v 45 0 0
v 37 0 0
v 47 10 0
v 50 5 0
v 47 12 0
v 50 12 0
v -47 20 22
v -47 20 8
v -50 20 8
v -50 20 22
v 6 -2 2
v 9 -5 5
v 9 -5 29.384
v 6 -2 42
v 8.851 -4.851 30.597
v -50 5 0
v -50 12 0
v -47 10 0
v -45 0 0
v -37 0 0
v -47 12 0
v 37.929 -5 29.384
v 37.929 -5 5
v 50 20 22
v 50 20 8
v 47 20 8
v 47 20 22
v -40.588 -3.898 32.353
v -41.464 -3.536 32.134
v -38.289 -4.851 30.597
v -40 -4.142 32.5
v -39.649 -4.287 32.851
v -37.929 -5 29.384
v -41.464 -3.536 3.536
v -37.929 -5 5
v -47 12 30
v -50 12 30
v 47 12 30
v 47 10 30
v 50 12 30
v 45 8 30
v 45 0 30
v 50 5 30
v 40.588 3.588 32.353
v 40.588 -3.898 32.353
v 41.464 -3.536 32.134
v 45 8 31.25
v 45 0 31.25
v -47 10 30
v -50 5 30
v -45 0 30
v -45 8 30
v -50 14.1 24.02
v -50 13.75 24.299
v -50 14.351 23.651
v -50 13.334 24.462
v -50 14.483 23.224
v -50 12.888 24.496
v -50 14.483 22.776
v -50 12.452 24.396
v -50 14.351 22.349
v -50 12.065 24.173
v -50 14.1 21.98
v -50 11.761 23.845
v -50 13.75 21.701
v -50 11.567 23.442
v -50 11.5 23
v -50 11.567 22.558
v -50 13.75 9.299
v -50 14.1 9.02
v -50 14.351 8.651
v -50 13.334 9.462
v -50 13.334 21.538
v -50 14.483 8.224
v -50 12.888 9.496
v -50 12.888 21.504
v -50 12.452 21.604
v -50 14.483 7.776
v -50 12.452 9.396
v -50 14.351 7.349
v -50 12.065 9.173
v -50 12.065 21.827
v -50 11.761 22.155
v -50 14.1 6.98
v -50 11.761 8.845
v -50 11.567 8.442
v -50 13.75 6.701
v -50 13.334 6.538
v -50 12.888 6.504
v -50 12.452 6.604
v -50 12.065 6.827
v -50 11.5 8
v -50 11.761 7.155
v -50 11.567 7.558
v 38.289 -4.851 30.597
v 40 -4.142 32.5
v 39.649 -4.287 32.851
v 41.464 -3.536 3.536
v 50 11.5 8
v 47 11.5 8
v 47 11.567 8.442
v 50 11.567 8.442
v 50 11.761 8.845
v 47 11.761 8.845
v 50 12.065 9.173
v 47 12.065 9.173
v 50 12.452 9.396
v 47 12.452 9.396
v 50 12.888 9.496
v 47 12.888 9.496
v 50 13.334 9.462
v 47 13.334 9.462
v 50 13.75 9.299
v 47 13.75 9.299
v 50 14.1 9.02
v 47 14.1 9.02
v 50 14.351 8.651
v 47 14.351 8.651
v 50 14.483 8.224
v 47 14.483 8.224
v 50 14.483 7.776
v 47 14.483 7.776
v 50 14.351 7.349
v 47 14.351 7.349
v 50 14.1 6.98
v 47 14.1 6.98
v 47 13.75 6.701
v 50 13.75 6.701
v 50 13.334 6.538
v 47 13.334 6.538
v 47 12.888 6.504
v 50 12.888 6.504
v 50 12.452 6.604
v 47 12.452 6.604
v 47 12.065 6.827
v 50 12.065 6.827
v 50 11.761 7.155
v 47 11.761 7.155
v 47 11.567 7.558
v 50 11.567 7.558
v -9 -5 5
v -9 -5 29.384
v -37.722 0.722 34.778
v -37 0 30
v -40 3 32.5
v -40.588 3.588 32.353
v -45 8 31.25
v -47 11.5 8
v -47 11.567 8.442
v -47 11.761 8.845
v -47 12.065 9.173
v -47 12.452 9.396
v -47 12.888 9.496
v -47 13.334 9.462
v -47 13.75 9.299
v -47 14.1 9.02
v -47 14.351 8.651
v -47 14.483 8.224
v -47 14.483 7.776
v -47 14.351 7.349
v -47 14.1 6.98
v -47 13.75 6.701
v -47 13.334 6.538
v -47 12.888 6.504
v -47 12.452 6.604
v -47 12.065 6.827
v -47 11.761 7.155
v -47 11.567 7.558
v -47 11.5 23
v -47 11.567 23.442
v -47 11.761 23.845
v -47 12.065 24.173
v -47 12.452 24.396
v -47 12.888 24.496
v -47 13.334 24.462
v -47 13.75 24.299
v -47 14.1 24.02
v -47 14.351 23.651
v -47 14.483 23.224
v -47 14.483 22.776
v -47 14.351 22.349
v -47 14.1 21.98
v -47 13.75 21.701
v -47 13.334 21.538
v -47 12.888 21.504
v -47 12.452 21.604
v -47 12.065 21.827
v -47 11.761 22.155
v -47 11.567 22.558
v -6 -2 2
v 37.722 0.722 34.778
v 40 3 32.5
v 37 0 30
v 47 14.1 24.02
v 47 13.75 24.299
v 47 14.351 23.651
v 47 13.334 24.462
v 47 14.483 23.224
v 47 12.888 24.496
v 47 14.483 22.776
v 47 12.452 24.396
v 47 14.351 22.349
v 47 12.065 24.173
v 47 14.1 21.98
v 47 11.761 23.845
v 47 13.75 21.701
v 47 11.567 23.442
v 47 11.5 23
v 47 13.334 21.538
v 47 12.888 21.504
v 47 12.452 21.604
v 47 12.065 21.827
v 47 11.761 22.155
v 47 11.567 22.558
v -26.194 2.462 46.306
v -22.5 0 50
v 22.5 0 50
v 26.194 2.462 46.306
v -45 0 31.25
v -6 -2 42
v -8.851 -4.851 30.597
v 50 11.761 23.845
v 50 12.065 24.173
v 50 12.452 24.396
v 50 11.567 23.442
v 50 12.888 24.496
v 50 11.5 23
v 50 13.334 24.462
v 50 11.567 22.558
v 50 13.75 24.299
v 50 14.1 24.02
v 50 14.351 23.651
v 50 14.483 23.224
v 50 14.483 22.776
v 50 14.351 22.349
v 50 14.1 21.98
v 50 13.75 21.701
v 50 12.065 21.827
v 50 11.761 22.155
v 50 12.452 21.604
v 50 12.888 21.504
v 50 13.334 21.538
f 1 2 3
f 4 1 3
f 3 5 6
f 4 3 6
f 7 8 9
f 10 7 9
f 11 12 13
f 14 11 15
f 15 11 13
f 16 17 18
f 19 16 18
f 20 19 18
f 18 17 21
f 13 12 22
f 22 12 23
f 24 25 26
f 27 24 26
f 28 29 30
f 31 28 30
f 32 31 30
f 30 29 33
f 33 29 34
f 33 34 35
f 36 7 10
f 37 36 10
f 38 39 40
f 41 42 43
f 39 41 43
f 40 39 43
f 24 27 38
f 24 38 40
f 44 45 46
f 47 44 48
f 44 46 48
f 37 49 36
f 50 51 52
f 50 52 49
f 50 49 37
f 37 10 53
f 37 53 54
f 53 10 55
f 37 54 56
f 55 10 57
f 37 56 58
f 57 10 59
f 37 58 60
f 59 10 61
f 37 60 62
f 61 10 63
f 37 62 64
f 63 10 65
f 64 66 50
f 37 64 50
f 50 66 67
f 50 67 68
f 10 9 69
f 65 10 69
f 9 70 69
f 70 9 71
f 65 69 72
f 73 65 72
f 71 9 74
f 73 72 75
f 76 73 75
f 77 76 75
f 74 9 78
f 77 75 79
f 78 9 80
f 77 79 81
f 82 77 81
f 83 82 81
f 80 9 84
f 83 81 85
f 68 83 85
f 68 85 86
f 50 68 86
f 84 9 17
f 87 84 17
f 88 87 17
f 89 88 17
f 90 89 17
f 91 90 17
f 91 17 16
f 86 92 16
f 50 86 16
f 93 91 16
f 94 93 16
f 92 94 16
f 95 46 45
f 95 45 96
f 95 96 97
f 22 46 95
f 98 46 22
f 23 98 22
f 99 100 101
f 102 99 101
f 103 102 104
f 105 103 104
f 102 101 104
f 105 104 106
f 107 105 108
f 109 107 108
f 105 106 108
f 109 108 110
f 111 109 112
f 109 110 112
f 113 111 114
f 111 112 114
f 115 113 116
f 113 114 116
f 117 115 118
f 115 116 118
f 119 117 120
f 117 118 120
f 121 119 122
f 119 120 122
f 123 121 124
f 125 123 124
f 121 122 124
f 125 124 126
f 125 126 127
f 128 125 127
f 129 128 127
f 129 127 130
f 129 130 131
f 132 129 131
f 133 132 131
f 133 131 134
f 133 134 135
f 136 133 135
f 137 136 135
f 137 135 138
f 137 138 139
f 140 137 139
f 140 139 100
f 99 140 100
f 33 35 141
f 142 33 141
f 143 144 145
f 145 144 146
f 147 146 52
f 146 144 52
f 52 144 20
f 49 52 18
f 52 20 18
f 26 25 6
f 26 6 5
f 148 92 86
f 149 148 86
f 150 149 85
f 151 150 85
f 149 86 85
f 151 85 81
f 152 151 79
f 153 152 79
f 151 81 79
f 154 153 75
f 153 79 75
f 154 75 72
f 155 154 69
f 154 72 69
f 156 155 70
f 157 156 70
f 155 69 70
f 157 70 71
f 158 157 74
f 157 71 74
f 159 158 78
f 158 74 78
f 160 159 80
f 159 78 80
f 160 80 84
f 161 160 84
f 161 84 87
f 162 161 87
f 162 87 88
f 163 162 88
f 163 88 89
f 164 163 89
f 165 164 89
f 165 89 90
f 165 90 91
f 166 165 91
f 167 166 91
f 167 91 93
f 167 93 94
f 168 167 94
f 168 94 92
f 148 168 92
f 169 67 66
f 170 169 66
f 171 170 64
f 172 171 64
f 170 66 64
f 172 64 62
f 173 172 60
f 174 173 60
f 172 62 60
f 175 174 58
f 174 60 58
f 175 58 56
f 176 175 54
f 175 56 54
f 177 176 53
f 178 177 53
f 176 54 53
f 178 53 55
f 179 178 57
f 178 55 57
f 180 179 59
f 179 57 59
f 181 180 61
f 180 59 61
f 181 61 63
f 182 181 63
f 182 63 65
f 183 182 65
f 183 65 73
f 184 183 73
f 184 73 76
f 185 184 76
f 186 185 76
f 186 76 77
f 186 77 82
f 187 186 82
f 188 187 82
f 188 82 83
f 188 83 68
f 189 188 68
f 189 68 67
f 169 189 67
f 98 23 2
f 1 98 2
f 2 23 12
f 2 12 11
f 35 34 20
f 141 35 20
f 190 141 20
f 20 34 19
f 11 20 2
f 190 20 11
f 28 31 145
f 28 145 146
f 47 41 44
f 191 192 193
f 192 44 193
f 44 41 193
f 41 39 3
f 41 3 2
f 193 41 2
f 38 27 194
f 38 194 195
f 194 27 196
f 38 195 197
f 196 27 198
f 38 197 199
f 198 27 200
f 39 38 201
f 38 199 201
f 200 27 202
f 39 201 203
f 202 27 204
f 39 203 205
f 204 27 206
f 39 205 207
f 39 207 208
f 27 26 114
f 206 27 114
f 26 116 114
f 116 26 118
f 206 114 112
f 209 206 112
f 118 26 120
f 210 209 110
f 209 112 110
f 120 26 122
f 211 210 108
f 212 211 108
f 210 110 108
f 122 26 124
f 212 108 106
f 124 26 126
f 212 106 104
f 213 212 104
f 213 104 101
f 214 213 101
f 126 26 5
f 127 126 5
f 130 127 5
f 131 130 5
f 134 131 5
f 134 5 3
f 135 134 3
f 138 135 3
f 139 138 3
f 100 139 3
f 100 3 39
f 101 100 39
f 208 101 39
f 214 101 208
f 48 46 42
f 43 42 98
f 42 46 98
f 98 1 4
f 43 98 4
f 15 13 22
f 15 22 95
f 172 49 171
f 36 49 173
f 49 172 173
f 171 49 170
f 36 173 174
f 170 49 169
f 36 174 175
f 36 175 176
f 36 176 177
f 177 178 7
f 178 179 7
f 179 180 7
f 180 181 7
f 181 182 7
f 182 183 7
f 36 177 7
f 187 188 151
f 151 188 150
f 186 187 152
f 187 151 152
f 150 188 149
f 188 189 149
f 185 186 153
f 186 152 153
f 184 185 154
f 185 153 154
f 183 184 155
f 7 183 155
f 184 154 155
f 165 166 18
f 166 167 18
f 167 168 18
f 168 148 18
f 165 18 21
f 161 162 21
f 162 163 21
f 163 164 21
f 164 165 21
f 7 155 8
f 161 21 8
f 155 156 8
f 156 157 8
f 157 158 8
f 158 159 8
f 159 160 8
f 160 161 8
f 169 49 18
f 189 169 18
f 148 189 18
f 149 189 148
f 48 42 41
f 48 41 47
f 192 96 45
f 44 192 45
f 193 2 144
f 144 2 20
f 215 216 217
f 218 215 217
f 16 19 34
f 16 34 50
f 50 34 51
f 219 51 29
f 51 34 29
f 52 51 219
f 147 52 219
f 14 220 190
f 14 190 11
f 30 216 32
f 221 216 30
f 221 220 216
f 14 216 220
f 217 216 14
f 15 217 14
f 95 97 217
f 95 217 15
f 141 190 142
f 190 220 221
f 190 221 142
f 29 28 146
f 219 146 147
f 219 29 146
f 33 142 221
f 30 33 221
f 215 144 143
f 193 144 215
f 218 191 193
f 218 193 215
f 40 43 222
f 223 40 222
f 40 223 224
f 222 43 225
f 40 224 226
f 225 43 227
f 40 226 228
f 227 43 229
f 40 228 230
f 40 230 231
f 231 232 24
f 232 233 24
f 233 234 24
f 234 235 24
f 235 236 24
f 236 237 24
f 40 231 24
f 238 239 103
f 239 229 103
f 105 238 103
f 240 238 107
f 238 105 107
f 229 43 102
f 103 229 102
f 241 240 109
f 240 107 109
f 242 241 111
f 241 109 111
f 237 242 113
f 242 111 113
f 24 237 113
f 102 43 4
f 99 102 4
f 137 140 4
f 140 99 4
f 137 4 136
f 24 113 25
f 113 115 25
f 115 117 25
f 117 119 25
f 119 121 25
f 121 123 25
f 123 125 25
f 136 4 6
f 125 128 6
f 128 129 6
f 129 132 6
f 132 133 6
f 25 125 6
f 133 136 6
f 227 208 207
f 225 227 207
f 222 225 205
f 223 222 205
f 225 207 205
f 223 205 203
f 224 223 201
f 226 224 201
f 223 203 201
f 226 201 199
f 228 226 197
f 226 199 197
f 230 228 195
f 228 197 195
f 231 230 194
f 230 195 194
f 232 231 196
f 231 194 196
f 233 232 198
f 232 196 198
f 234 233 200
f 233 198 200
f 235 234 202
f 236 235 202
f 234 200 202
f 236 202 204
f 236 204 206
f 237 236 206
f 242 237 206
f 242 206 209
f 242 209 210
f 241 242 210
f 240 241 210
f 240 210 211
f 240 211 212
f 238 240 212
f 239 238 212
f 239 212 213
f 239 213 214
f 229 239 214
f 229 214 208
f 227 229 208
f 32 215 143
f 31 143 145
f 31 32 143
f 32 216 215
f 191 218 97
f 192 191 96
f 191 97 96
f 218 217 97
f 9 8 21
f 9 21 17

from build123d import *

# Parameters (mm, degrees)
F1_DEPTH      = 30
F2_SIZE       = 10
F4_DEPTH      = 50
F5_DEPTH      = 20
F6_DEPTH      = 25
F8_DEPTH      = 25.001
F9_DEPTH      = 25
F11_W         = 8
F11_H         = 3
F12_DEPTH     = 50.001
F13_T1_DEPTH  = 61.7168298797
F13_T3_DEPTH  = 40.0719817161
F13_T5_DEPTH  = 45.2357066129
F13_T10_DEPTH = 64.7177203375
F13_T15_DEPTH = 64.7177203375
F14_T1_DEPTH  = 56.7168298797
F14_T3_DEPTH  = 45.2357066129
F14_T5_DEPTH  = 35.0719817161
F15_R         = 1.5
F16_DEPTH     = 100.001
F18_SIZE      = 8
F19_SIZE      = 2.99999


# Not quite as in the source:
# - a fillet or chamfer that OpenCascade refuses, or shapes differently, is made with other operations: its cross-section is extruded or revolved along the edge and cut away or added
# - a fillet or chamfer is up to 0.001 mm smaller than in the source, because OpenCascade refuses the exact size


with BuildPart() as f1:
    # F0 (on Top) → F1 (new body)
    with BuildSketch(Plane.XY):
        Polygon((-47, 20), (-50, 20), (-50, -5), (50, -5), (50, 20), (47, 20), (47, 0), (-47, 0), align=None)
    extrude(amount=F1_DEPTH)

    # F2
    f2_edges = [f1.edges().sort_by_distance(p)[0] for p in [
        (-47, 0, 15),
        (47, 0, 15),
        (-50, -5, 15),
        (50, -5, 15),
    ]]
    chamfer(f2_edges, length=F2_SIZE)

    # F3 (on Right) → F4 (join, symmetric)
    with BuildSketch(Plane.YZ):
        Polygon((-5, 30), (0, 30), (2.9104275004, 49.2723931249), (0, 50), align=None)
    extrude(amount=F4_DEPTH, both=True)

    # F5 (add): faces of the model
    f5_faces = [f1.faces().sort_by_distance(p)[0] for p in [
        (46.0427350427, 7.6495726496, 30),
        (-46.0427350427, 7.6495726496, 30),
    ]]
    extrude(f5_faces, amount=F5_DEPTH)

    # F6 (cut): faces of the model
    f6_faces = [f1.faces().sort_by_distance(p)[0] for p in [
        (46.1111111111, -2.7777777778, 30),
        (-46.1111111111, -2.7777777778, 30),
    ]]
    extrude(f6_faces, amount=-F6_DEPTH, mode=Mode.SUBTRACT)

    # F7 (on face) → F8 (cut, through all)
    with BuildSketch(Plane.XZ.offset(5)):
        Polygon((40.5882352941, 32.3529411765), (45, 50), (37, 50), (22.5, 50), (40, 32.5), align=None)
        Polygon((45, 31.25), (45, 50), (40.5882352941, 32.3529411765), align=None)
        Polygon((45, 50), (47.9104275004, 49.2723931249), (45.1819017188, 31.2045245703), (50, 30), (50, 50), align=None)
    extrude(amount=-F8_DEPTH, mode=Mode.SUBTRACT)

    # F9 (cut): a face of the model
    f9_faces = [f1.faces().sort_by_distance(p)[0] for p in [
        (46.0411372728, 0, 41.900989059),
    ]]
    extrude(f9_faces, amount=-F9_DEPTH, mode=Mode.SUBTRACT)

    # F10: F1 across plane


with BuildPart() as f1_1:
    add(f1.part)
    add(f1.part.mirror(Plane.YZ), mode=Mode.INTERSECT)

    # F11 (on face) → F12 (cut, through all)
    with BuildSketch(Plane(origin=(0, 0, 0), x_dir=(1, 0, 0), z_dir=(0, 0, -1))):
        with Locations((0, 3.5)):
            Rectangle(F11_W, F11_H)
    extrude(amount=-F12_DEPTH, mode=Mode.SUBTRACT)

    # F13: chamfer of 5 on 5 edges, made by hand

    # F13_s2 → F13_t1 (cut)
    with BuildSketch(Plane.YZ.offset(-52.8584149398)):
        Polygon((0, 0), (-5, 5), (-5, 0), align=None)
    extrude(amount=F13_T1_DEPTH, mode=Mode.SUBTRACT)

    # F13_s4 → F13_t3 (cut)
    with BuildSketch(Plane.YZ.offset(-42.0359908581)):
        Polygon((-5, 29.3844718719), (-4.8507125007, 30.5971499971), (-5, 30), align=None)
    extrude(amount=F13_T3_DEPTH, mode=Mode.SUBTRACT)

    # F13_s6 → F13_t5 (cut)
    with BuildSketch(Plane.XY.offset(-5.6428543011)):
        Polygon((-41.4644660941, -3.5355339059), (-37.9289321881, -5), (-40, -5), align=None)
    extrude(amount=F13_T5_DEPTH, mode=Mode.SUBTRACT)


with BuildPart() as f13_tool8:
    # F13_s9 → F13_t10 (new body)
    with BuildSketch(Plane.XY.offset(-12.8584149398)):
        Polygon((9, -5), (4, 0), (4, -5), align=None)
    extrude(amount=F13_T10_DEPTH)

    split(bisect_by=Plane.XZ.offset(2), keep=Keep.TOP)


with BuildPart() as f1_2:
    add(f1_1.part)

    # F13_t7: cut F13_tool8
    add(f13_tool8.part, mode=Mode.SUBTRACT)


with BuildPart() as f13_tool13:
    # F13_s14 → F13_t15 (new body)
    with BuildSketch(Plane.XY.offset(-12.8584149398)):
        Polygon((-4, 0), (-9, -5), (-4, -5), align=None)
    extrude(amount=F13_T15_DEPTH)

    split(bisect_by=Plane.XZ.offset(2), keep=Keep.TOP)


with BuildPart() as f1_3:
    add(f1_2.part)

    # F13_t12: cut F13_tool13
    add(f13_tool13.part, mode=Mode.SUBTRACT)

    # F14: chamfer of 5 on 3 edges, made by hand

    # F14_s2 → F14_t1 (cut)
    with BuildSketch(Plane.YZ.offset(-3.8584149398)):
        Polygon((-5, 5), (0, 0), (-5, 0), align=None)
    extrude(amount=F14_T1_DEPTH, mode=Mode.SUBTRACT)

    # F14_s4 → F14_t3 (cut)
    with BuildSketch(Plane.XY.offset(-5.6428543011)):
        Polygon((41.4644660941, -3.5355339059), (37.9289321881, -5), (40, -5), align=None)
    extrude(amount=F14_T3_DEPTH, mode=Mode.SUBTRACT)

    # F14_s6 → F14_t5 (cut)
    with BuildSketch(Plane.YZ.offset(6.9640091419)):
        Polygon((-5, 29.3844718719), (-4.8507125007, 30.5971499971), (-5, 30), align=None)
    extrude(amount=F14_T5_DEPTH, mode=Mode.SUBTRACT)

    # F15 (on face) → F16 (cut, through all)
    with BuildSketch(Plane(origin=(-50, 0, 0), x_dir=(0, -1, 0), z_dir=(-1, 0, 0))):
        with Locations((-13, 23)):
            Circle(F15_R)
        with Locations((-13, 8)):
            Circle(F15_R)
    extrude(amount=-F16_DEPTH, mode=Mode.SUBTRACT)

    # F17: F1 across plane


with BuildPart() as f1_4:
    add(f1_3.part)
    add(f1_3.part.mirror(Plane.YZ), mode=Mode.INTERSECT)

    # F18
    f18_edges = [f1_4.edges().sort_by_distance(p)[0] for p in [
        (48.5, 20, 0),
        (-48.5, 20, 0),
        (-48.5, 20, 30),
        (48.5, 20, 30),
    ]]
    chamfer(f18_edges, length=F18_SIZE)

    # F19 (size 3 in the source; OpenCascade refuses exactly that, so slightly less here)
    f19_edges = [f1_4.edges().sort_by_distance(p)[0] for p in [
        (0, 2.910428, 49.272393),
    ]]
    chamfer(f19_edges, length=F19_SIZE)


solid = f1_4.part
